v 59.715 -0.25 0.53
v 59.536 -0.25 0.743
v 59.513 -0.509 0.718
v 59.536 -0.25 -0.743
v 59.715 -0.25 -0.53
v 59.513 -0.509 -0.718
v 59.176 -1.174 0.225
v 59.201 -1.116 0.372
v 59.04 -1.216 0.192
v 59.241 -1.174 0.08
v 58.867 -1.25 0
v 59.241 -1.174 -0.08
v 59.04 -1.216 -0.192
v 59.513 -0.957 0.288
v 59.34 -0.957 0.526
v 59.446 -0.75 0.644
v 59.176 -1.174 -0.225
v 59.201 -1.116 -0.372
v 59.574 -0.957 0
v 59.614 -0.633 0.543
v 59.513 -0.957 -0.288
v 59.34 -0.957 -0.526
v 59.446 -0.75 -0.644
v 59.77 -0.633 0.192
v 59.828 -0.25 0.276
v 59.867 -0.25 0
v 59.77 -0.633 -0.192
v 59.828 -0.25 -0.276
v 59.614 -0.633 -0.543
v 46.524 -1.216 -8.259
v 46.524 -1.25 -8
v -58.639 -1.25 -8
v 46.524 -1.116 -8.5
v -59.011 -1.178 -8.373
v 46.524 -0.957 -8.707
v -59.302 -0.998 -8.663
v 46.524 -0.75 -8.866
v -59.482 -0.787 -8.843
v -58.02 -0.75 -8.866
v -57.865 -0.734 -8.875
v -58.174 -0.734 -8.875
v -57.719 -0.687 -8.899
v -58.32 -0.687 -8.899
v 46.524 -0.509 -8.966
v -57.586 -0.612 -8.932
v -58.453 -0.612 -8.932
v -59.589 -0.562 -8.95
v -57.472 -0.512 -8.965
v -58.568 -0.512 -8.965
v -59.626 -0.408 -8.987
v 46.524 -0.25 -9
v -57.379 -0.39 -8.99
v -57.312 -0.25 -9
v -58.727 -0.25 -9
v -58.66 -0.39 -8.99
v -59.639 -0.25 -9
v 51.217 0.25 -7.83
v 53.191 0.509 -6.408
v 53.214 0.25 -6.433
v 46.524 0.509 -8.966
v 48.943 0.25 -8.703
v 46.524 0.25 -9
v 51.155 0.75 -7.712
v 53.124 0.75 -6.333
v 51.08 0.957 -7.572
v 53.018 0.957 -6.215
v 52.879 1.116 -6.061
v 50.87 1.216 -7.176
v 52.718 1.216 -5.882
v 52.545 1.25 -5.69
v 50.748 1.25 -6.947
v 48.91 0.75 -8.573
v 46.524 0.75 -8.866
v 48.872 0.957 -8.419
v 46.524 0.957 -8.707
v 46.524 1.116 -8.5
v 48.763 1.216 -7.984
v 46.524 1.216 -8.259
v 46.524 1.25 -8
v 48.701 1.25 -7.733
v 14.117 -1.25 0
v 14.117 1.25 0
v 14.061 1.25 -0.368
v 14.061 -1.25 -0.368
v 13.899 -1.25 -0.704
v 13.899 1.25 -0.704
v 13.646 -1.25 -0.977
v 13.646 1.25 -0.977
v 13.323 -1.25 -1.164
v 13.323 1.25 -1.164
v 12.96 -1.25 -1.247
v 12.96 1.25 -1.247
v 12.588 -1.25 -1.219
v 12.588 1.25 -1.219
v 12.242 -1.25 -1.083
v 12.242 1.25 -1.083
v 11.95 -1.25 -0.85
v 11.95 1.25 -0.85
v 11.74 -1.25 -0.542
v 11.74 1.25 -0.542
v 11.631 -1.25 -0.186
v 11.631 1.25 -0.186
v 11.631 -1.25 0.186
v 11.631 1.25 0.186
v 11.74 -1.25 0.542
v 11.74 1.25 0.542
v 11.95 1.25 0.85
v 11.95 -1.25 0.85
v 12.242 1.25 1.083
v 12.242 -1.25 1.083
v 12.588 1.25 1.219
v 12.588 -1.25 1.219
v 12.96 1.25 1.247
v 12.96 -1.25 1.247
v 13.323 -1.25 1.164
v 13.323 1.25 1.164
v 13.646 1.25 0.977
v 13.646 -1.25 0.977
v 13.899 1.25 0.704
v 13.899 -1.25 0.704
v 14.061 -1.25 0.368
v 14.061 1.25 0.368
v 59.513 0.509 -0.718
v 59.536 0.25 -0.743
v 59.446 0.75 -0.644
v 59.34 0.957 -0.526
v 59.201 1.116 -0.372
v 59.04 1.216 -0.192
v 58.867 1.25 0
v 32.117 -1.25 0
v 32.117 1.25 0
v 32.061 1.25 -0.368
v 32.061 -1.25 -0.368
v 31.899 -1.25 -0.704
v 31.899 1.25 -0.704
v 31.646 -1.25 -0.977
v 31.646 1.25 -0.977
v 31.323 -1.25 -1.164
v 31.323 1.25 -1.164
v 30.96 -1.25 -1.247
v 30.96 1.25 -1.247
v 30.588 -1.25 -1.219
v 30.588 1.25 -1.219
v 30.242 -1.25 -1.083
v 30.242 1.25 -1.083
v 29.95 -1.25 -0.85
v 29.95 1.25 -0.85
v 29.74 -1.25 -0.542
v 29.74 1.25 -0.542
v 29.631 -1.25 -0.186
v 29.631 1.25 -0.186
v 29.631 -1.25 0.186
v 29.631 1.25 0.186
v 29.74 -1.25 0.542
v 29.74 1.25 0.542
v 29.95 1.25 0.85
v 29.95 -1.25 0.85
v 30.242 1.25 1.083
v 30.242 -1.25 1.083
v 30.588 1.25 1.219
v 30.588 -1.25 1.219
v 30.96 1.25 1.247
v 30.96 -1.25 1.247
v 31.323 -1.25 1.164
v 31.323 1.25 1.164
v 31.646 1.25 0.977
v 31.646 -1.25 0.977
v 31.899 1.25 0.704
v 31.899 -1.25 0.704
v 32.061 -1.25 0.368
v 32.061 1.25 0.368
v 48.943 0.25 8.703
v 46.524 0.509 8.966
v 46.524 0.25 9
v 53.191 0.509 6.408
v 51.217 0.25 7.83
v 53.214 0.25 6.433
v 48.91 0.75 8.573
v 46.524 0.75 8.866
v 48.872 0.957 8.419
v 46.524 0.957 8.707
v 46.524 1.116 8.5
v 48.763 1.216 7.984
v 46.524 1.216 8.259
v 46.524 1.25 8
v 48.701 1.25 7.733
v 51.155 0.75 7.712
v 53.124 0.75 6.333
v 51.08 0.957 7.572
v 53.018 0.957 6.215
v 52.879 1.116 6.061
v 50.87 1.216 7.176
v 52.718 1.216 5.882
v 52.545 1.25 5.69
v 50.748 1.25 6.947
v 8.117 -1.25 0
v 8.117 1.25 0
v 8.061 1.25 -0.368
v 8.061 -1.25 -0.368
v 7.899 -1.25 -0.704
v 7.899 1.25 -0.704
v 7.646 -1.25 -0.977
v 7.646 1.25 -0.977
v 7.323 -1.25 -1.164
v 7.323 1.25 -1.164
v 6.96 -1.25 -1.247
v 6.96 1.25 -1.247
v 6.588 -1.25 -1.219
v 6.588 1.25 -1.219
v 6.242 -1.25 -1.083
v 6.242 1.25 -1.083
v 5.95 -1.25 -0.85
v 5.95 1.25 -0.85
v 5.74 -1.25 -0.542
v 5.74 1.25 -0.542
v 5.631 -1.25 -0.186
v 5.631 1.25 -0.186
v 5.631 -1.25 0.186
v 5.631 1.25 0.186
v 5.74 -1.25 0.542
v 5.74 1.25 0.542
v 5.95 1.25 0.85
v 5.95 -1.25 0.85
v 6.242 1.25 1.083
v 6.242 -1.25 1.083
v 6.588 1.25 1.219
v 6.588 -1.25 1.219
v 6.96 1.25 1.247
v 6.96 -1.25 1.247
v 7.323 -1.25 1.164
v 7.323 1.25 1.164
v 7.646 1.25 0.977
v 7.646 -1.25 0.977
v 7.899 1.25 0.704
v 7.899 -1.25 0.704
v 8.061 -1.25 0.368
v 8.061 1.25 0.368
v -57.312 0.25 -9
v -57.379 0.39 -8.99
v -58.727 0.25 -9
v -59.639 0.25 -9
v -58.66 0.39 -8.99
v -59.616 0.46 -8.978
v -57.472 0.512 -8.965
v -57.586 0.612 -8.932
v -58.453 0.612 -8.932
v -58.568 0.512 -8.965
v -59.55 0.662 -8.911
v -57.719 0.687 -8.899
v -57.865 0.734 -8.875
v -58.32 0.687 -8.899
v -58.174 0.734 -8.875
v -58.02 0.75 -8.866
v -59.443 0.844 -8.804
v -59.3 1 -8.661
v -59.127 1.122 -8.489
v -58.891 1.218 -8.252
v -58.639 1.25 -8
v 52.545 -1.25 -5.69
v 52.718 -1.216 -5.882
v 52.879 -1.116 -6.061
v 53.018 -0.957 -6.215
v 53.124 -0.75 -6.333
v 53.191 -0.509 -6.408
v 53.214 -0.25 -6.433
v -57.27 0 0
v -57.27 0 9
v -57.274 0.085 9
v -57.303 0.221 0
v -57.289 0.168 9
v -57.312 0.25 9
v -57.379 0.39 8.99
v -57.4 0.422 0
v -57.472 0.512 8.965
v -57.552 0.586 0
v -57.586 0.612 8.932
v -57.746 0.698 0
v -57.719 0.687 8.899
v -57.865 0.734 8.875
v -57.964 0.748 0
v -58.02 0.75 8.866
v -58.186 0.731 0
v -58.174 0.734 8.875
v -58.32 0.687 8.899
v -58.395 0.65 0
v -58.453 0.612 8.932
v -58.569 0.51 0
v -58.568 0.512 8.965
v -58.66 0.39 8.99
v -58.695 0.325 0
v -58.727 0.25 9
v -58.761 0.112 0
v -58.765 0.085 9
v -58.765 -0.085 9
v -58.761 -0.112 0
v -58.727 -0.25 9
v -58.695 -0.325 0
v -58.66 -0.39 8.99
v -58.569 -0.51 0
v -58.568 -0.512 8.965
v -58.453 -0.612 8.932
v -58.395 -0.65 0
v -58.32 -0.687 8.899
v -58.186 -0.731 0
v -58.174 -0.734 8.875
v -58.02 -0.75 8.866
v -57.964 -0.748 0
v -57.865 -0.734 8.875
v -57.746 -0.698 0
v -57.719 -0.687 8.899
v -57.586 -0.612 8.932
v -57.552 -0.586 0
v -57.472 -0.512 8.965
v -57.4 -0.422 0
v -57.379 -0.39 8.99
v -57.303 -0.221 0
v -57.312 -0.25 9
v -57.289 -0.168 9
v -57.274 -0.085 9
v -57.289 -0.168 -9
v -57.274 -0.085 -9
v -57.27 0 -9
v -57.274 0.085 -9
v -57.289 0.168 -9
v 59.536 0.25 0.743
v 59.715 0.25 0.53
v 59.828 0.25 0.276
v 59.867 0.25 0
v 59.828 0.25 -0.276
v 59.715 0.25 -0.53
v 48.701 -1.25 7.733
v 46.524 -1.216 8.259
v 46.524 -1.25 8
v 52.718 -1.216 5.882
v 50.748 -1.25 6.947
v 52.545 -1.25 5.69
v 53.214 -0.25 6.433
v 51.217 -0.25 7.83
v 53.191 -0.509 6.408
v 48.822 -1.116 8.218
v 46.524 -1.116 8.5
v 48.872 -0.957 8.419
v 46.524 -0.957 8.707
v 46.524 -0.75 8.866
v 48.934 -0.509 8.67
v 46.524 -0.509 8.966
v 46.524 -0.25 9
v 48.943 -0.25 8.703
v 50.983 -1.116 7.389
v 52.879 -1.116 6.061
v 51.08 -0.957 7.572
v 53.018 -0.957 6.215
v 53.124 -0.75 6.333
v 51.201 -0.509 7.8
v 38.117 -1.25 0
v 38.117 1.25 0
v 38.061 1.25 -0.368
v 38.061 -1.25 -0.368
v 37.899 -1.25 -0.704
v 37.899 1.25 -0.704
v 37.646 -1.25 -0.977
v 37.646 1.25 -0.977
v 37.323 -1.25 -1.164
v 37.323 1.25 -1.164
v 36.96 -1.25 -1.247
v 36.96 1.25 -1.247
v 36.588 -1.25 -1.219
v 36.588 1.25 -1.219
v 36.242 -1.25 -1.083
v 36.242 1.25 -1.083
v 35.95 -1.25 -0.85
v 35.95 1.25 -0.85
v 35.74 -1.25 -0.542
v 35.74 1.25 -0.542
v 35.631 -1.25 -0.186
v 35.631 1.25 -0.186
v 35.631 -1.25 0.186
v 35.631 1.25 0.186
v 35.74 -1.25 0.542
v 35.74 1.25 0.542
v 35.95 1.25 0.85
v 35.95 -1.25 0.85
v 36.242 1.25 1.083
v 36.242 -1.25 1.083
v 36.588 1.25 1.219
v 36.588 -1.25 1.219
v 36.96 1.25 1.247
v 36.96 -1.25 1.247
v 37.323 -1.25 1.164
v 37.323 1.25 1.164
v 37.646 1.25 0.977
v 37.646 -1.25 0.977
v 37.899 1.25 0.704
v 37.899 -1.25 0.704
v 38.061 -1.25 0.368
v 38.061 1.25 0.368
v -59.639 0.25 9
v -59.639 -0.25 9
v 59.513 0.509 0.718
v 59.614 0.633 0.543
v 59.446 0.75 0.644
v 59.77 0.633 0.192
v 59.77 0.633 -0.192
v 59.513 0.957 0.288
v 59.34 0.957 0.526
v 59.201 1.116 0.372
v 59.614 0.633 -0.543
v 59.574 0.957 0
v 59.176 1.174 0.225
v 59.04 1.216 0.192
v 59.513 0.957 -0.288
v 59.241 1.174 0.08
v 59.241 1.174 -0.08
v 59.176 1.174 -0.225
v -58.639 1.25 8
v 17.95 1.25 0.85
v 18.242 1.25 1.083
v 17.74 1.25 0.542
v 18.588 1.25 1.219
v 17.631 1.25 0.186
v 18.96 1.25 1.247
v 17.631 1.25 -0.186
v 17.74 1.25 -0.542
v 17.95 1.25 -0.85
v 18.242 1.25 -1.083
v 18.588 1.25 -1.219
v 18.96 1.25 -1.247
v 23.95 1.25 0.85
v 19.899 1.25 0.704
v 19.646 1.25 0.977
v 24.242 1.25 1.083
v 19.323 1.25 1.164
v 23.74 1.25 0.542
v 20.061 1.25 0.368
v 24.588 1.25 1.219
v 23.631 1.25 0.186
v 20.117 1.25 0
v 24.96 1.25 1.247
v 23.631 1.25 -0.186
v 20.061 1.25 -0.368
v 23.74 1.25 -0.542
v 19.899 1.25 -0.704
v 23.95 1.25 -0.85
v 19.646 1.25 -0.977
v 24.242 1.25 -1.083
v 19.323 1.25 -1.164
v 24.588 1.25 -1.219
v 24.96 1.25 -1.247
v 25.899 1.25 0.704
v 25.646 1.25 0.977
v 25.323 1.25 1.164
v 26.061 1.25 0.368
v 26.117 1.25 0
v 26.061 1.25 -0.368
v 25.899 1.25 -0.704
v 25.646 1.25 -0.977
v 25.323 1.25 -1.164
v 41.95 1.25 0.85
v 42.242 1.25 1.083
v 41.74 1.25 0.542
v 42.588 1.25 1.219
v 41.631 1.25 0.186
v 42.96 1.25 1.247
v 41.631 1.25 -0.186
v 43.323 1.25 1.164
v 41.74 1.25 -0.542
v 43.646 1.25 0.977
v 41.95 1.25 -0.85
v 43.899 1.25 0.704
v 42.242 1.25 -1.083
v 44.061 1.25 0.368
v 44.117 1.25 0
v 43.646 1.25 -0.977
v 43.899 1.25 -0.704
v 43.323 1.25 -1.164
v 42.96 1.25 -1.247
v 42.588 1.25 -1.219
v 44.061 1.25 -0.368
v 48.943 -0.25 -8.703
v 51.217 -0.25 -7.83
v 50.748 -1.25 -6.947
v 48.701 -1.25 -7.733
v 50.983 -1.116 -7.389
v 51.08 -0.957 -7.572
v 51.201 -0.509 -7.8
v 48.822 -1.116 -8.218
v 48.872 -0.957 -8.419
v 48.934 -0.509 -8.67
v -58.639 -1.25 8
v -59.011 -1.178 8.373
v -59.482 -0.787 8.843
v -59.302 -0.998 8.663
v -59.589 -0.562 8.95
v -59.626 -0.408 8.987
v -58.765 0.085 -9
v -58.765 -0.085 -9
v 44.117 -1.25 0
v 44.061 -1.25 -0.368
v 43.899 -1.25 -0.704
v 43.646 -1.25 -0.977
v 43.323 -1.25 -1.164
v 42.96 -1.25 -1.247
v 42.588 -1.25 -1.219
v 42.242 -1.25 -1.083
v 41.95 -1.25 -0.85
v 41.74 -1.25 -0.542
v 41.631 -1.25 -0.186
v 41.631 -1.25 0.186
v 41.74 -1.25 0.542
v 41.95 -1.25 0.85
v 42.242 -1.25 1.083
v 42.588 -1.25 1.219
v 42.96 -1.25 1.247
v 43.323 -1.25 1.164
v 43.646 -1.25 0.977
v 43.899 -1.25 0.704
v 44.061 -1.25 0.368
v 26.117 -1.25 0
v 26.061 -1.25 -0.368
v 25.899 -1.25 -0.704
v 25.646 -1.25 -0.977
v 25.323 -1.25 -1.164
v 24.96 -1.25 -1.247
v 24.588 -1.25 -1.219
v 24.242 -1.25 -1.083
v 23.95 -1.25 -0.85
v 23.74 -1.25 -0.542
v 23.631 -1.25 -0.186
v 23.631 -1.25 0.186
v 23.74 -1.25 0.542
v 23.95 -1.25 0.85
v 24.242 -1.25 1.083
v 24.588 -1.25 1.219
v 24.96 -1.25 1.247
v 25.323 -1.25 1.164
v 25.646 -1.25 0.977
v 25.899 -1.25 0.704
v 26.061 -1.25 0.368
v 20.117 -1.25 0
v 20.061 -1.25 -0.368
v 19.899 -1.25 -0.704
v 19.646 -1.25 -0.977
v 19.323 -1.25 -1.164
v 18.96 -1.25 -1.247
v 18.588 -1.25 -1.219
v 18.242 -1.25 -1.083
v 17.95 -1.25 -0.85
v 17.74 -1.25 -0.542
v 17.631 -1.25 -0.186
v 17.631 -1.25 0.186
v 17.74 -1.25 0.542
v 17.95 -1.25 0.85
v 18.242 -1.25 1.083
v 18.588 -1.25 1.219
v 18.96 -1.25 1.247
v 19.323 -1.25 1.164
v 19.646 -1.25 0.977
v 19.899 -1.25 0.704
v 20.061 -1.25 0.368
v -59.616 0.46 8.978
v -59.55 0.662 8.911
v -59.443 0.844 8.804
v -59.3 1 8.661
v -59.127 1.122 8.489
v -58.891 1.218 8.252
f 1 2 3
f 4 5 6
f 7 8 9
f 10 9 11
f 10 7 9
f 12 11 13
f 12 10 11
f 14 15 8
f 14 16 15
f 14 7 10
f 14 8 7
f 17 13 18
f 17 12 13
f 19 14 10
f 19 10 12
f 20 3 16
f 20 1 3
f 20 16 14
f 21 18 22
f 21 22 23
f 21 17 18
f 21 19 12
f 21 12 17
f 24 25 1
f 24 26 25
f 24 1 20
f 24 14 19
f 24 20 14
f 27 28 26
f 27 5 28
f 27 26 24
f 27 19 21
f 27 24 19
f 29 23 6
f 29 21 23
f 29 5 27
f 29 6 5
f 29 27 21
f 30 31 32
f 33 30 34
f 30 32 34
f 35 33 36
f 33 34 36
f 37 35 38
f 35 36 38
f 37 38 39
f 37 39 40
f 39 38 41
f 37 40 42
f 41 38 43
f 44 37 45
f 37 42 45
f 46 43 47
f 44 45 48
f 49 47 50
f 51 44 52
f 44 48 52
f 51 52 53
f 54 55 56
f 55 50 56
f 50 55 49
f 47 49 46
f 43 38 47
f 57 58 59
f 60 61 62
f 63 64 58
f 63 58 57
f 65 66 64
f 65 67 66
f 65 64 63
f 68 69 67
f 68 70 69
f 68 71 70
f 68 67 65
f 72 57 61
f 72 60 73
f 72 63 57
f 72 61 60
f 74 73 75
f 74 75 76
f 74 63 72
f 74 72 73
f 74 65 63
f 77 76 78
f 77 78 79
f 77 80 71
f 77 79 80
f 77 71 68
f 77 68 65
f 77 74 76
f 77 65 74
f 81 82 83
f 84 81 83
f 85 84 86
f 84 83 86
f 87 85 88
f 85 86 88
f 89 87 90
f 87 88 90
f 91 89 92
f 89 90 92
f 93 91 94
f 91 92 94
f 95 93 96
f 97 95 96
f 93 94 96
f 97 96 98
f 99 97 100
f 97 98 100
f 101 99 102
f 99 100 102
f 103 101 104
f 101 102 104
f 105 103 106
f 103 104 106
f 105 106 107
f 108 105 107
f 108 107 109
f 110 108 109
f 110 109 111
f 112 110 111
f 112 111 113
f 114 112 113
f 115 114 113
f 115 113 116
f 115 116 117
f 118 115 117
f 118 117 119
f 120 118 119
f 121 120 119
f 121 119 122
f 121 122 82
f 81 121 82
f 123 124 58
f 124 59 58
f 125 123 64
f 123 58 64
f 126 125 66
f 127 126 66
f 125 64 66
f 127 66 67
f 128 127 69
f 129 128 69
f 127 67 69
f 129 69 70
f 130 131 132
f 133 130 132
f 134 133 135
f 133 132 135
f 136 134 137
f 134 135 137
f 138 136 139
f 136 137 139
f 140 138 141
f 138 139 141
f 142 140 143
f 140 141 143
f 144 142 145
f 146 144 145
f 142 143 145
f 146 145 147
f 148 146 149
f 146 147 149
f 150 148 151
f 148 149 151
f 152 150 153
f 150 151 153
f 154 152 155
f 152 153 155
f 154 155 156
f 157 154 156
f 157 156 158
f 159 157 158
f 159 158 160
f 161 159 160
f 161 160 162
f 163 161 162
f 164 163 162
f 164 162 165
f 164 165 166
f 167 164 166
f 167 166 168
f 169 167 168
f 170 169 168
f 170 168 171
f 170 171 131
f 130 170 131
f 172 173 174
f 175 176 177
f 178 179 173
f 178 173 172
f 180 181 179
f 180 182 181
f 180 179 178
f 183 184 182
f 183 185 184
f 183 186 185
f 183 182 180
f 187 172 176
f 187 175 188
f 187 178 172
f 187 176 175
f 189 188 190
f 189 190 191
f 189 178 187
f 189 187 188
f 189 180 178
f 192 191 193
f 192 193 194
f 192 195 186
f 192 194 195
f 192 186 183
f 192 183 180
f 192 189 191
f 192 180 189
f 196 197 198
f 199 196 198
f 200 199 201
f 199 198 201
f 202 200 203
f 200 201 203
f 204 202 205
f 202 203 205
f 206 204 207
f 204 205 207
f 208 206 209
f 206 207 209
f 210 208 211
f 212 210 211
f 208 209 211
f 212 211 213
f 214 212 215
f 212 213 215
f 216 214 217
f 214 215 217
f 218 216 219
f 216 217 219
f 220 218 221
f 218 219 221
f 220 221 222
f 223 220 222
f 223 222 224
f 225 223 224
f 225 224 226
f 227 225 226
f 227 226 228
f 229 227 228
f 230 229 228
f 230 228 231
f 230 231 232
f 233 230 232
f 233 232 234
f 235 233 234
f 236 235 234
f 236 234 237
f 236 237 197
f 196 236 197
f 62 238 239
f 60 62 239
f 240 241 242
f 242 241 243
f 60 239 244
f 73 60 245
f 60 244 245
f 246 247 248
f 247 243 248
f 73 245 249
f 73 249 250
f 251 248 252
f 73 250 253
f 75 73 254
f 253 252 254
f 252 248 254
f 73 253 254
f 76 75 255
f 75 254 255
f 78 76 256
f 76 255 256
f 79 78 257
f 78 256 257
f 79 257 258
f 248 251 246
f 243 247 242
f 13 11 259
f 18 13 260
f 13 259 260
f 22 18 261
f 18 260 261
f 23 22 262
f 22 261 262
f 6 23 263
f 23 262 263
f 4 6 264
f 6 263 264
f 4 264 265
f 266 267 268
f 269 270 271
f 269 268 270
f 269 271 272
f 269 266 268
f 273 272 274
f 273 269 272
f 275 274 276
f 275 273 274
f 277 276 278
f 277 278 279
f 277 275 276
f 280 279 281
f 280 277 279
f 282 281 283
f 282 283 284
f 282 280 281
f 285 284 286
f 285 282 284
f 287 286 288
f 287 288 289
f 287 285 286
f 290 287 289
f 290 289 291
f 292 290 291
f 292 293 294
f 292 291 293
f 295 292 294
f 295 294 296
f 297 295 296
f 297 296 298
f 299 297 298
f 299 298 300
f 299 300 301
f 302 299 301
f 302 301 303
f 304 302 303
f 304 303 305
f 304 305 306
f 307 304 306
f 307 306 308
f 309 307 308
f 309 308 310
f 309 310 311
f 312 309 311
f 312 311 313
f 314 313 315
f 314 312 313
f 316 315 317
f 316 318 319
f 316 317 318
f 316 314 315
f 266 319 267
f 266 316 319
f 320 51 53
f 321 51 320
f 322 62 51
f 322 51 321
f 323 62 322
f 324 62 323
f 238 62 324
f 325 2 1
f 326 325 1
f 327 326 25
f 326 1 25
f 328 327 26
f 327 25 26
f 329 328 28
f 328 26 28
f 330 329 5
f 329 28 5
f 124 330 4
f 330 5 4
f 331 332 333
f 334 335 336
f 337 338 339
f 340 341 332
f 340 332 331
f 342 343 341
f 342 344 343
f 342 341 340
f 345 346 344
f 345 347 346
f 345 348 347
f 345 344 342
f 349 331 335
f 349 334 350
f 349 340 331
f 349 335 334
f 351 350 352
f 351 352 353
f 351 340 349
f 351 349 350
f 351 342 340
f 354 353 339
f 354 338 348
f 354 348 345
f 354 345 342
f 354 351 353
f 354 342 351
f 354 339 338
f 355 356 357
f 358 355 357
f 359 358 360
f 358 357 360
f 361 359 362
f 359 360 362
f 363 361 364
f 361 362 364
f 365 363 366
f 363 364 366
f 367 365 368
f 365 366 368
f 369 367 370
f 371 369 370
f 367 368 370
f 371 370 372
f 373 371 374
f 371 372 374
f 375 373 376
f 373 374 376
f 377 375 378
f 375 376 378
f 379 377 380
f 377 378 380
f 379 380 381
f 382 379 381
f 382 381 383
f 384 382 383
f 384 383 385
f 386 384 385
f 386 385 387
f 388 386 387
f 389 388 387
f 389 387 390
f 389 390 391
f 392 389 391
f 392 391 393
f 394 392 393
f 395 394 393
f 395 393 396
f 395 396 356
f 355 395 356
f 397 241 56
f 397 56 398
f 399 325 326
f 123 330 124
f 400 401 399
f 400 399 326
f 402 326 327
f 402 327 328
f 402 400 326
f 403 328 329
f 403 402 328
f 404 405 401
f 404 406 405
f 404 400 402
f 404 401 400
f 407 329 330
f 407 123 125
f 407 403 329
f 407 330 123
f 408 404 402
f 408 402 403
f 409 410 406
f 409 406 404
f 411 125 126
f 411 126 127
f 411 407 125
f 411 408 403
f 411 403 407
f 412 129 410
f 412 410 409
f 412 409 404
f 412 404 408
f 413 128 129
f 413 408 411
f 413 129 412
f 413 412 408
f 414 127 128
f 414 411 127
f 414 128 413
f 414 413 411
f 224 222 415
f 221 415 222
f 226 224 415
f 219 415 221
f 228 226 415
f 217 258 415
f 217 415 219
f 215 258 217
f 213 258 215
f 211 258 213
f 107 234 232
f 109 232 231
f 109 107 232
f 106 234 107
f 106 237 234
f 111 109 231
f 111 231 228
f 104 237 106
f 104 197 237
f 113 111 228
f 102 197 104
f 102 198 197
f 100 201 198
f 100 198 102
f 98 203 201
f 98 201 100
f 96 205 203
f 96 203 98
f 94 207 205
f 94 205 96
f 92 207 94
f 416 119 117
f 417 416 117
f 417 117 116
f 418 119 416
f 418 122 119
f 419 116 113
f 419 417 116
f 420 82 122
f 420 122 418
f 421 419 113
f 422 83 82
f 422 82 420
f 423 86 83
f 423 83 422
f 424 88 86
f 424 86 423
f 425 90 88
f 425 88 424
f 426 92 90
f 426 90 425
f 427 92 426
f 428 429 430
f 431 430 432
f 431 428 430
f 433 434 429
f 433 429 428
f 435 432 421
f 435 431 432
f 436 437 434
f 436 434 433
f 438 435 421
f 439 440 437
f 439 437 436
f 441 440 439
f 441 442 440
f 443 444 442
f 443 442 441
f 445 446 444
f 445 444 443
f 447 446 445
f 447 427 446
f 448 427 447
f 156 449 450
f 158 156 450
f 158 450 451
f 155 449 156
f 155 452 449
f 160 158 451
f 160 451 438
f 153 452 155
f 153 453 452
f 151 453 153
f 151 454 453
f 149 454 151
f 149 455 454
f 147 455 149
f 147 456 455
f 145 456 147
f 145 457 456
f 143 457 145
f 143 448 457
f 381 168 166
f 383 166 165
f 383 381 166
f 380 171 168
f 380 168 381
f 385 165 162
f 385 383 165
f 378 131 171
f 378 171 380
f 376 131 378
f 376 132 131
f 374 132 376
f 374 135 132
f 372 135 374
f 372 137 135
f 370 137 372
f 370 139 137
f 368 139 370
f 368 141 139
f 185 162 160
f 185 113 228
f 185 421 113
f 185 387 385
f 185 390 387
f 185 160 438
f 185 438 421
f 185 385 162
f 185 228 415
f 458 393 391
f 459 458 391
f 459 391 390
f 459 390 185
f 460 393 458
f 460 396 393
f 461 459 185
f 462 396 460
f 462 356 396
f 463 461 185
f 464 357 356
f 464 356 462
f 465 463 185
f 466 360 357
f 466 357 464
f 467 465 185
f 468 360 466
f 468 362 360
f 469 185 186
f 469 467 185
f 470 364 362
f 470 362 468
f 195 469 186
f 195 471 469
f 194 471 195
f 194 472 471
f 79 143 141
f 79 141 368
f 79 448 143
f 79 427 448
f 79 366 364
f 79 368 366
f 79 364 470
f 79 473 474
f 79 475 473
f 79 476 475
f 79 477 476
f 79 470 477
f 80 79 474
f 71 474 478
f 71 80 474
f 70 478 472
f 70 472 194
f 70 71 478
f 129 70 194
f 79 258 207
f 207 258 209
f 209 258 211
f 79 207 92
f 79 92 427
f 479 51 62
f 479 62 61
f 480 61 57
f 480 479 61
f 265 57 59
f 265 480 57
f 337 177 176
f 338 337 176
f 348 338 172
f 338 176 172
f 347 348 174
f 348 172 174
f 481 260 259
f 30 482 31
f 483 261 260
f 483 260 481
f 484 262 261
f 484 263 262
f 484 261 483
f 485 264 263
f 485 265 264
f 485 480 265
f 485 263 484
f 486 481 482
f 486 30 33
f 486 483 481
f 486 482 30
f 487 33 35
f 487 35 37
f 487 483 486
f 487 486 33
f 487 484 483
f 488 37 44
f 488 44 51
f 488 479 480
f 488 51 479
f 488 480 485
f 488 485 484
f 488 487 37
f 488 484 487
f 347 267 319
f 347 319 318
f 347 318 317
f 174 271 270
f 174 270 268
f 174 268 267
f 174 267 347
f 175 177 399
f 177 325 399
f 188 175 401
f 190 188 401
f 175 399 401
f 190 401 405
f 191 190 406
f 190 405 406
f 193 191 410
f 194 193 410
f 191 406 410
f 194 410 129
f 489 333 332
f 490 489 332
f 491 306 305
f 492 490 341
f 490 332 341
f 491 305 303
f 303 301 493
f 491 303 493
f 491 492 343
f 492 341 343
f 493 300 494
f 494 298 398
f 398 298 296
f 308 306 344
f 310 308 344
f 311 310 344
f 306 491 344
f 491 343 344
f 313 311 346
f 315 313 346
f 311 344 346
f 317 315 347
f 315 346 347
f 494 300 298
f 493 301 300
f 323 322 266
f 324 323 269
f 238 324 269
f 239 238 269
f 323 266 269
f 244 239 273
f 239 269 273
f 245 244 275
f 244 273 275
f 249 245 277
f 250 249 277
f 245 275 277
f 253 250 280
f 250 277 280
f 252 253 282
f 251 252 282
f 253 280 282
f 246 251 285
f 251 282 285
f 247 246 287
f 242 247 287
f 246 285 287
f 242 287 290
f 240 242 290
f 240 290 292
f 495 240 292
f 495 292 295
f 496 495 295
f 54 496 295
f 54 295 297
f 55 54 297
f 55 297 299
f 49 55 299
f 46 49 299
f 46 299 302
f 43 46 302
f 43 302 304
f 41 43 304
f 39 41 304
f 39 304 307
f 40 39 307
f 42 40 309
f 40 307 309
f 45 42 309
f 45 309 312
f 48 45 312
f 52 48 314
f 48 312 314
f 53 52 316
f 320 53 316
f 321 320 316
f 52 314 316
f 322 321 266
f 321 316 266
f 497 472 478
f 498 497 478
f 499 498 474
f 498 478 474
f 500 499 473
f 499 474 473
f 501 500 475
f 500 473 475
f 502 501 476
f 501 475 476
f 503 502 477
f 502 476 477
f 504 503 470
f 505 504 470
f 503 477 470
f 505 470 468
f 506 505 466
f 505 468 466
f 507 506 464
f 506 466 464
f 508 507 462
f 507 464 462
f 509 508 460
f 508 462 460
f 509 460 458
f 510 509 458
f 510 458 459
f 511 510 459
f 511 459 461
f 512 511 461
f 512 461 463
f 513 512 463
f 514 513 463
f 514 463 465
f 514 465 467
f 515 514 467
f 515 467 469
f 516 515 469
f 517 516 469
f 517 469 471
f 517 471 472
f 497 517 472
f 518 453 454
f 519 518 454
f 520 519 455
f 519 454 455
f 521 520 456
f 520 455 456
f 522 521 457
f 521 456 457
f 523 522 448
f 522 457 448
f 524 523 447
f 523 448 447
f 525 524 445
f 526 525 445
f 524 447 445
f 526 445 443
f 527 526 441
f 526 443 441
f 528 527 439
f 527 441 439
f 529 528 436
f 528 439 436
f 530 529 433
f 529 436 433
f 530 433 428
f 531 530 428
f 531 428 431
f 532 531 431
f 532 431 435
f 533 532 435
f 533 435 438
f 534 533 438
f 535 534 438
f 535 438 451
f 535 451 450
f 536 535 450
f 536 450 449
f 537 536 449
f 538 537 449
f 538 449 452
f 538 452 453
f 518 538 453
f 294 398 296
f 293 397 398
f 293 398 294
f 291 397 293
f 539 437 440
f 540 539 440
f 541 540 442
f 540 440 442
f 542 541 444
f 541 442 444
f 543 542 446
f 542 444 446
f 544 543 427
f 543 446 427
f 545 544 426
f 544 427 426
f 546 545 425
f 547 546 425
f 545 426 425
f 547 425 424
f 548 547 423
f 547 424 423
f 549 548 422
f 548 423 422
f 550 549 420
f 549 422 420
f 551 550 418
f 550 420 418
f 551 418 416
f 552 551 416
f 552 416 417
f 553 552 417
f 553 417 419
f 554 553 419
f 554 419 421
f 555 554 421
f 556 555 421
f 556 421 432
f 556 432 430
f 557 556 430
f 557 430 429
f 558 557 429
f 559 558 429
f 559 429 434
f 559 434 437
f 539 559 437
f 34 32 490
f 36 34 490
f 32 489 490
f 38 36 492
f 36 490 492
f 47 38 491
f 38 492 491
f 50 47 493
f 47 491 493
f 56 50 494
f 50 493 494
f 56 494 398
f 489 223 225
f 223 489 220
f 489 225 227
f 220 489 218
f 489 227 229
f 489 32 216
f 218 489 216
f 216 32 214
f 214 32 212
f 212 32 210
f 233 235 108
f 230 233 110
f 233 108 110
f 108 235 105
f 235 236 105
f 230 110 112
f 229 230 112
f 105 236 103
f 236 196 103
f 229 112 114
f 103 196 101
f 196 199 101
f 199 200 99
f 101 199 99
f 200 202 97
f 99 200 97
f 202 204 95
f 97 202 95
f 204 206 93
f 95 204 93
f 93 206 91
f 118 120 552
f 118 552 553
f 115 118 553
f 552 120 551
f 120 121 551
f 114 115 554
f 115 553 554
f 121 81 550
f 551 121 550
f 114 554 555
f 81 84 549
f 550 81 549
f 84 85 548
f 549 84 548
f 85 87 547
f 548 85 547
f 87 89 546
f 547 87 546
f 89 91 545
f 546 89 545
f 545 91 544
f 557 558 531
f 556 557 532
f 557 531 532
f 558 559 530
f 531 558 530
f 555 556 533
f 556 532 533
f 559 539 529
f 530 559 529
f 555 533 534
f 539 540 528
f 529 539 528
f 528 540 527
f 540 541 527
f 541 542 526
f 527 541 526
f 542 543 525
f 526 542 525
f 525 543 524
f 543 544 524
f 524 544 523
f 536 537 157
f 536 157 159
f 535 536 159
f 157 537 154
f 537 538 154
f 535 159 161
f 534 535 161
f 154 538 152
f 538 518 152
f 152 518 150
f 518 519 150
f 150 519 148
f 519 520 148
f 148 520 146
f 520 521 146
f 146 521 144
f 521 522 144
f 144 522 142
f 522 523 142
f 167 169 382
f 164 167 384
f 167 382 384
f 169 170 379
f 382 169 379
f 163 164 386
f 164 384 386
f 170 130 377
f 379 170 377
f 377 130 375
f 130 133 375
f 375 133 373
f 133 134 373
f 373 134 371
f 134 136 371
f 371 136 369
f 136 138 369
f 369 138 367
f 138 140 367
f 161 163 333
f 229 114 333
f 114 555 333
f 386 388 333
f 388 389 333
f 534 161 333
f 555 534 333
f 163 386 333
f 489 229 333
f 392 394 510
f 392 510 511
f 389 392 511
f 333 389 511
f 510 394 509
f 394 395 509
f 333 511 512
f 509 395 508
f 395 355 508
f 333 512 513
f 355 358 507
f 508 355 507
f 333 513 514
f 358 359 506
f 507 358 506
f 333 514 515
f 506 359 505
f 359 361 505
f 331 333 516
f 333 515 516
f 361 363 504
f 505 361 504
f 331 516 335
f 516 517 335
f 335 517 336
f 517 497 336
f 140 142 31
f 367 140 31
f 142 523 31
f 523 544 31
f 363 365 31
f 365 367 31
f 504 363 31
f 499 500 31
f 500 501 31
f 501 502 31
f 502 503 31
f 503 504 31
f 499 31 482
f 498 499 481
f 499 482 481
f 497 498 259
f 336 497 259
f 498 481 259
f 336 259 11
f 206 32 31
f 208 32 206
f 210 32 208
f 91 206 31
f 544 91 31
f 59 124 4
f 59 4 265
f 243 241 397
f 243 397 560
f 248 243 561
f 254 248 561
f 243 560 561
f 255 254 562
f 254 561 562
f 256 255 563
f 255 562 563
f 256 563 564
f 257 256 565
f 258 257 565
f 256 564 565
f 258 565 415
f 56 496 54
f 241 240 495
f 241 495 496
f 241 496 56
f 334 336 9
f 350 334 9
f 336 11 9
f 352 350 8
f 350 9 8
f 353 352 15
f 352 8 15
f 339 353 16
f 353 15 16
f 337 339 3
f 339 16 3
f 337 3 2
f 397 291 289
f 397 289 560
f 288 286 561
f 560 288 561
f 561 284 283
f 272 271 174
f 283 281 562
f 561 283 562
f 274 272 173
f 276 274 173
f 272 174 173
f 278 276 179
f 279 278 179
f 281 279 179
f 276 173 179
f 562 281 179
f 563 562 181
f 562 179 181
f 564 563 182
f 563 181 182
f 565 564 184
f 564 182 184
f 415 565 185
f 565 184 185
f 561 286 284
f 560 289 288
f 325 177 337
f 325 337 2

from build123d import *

# Parameters (mm, degrees)
BOSS_EXTRUDE1_DEPTH     = 1.25
FILLET1_R               = 10
FILLET2_R               = 1
FILLET3_R               = 1
SKETCH2_R               = 1.25
CUT_EXTRUDE1_DEPTH      = 3.5
LPATTERN1_COUNT         = 7
LPATTERN1_PITCH         = 6
SKETCH3_R               = 0.75
CUT_EXTRUDE2_DEPTH      = 10.0000001
CUT_EXTRUDE2_DEPTH_BACK = 10


with BuildPart() as part:
    # Sketch1 → Boss-Extrude1 (new body, symmetric)
    with BuildSketch(Plane(origin=(0, 0, 0), x_dir=(1, 0, 0), z_dir=(0, 1, 0))):
        Polygon((-59.638554217, 9), (-59.638554217, -9), (50.361445783, -9), (60.361445783, 0), (50.361445783, 9), align=None)
    extrude(amount=BOSS_EXTRUDE1_DEPTH, both=True)

    # Fillet1
    fillet1_edges = [part.edges().sort_by_distance(p)[0] for p in [
        (50.361445783, 0, 9),
        (50.361445783, 0, -9),
    ]]
    fillet(fillet1_edges, radius=FILLET1_R)

    # Fillet2
    fillet2_edges = [part.edges().sort_by_distance(p)[0] for p in [
        (60.361445783, 0, 0),
    ]]
    fillet(fillet2_edges, radius=FILLET2_R)

    # Fillet3
    fillet3_edges = [part.edges().sort_by_distance(p)[0] for p in [
        (-59.638554217, 1.25, 0),
        (-6.557234243, -1.25, -9),
        (-6.557234243, 1.25, -9),
        (56.374648223, -1.25, 3.588117804),
        (50.106723403, -1.25, 8.336204117),
        (50.106723403, -1.25, -8.336204117),
        (-6.557234243, 1.25, 9),
        (56.374648223, 1.25, 3.588117804),
        (50.106723403, 1.25, 8.336204117),
        (50.106723403, 1.25, -8.336204117),
        (56.374648223, -1.25, -3.588117804),
        (56.374648223, 1.25, -3.588117804),
        (59.866598667, -1.25, 0),
        (59.866598667, 1.25, 0),
        (-6.557234243, -1.25, 9),
        (-59.638554217, -1.25, 0),
    ]]
    fillet(fillet3_edges, radius=FILLET3_R)

    # Sketch2 → Cut-Extrude1 (cut, through all)
    with BuildSketch(Plane(origin=(0, 1.25, 0), x_dir=(1, 0, 0), z_dir=(0, 1, 0))):
        with Locations((42.866598667, 0)):
            Circle(SKETCH2_R)
    cut_extrude1 = extrude(amount=-CUT_EXTRUDE1_DEPTH, mode=Mode.SUBTRACT)

    # LPattern1: Cut-Extrude1 ×7
    with Locations(*[(-i * LPATTERN1_PITCH, 0, 0) for i in range(1, LPATTERN1_COUNT)]):
        add(cut_extrude1, mode=Mode.SUBTRACT)

    # Sketch3 → Cut-Extrude2 (cut, two sides)
    with BuildSketch(Plane.XY) as cut_extrude2_sk:
        with Locations((-58.019579169, 0)):
            Circle(SKETCH3_R)
    extrude(amount=CUT_EXTRUDE2_DEPTH, mode=Mode.SUBTRACT)
    extrude(cut_extrude2_sk.sketch, amount=-CUT_EXTRUDE2_DEPTH_BACK, mode=Mode.SUBTRACT)


solid = part.part
